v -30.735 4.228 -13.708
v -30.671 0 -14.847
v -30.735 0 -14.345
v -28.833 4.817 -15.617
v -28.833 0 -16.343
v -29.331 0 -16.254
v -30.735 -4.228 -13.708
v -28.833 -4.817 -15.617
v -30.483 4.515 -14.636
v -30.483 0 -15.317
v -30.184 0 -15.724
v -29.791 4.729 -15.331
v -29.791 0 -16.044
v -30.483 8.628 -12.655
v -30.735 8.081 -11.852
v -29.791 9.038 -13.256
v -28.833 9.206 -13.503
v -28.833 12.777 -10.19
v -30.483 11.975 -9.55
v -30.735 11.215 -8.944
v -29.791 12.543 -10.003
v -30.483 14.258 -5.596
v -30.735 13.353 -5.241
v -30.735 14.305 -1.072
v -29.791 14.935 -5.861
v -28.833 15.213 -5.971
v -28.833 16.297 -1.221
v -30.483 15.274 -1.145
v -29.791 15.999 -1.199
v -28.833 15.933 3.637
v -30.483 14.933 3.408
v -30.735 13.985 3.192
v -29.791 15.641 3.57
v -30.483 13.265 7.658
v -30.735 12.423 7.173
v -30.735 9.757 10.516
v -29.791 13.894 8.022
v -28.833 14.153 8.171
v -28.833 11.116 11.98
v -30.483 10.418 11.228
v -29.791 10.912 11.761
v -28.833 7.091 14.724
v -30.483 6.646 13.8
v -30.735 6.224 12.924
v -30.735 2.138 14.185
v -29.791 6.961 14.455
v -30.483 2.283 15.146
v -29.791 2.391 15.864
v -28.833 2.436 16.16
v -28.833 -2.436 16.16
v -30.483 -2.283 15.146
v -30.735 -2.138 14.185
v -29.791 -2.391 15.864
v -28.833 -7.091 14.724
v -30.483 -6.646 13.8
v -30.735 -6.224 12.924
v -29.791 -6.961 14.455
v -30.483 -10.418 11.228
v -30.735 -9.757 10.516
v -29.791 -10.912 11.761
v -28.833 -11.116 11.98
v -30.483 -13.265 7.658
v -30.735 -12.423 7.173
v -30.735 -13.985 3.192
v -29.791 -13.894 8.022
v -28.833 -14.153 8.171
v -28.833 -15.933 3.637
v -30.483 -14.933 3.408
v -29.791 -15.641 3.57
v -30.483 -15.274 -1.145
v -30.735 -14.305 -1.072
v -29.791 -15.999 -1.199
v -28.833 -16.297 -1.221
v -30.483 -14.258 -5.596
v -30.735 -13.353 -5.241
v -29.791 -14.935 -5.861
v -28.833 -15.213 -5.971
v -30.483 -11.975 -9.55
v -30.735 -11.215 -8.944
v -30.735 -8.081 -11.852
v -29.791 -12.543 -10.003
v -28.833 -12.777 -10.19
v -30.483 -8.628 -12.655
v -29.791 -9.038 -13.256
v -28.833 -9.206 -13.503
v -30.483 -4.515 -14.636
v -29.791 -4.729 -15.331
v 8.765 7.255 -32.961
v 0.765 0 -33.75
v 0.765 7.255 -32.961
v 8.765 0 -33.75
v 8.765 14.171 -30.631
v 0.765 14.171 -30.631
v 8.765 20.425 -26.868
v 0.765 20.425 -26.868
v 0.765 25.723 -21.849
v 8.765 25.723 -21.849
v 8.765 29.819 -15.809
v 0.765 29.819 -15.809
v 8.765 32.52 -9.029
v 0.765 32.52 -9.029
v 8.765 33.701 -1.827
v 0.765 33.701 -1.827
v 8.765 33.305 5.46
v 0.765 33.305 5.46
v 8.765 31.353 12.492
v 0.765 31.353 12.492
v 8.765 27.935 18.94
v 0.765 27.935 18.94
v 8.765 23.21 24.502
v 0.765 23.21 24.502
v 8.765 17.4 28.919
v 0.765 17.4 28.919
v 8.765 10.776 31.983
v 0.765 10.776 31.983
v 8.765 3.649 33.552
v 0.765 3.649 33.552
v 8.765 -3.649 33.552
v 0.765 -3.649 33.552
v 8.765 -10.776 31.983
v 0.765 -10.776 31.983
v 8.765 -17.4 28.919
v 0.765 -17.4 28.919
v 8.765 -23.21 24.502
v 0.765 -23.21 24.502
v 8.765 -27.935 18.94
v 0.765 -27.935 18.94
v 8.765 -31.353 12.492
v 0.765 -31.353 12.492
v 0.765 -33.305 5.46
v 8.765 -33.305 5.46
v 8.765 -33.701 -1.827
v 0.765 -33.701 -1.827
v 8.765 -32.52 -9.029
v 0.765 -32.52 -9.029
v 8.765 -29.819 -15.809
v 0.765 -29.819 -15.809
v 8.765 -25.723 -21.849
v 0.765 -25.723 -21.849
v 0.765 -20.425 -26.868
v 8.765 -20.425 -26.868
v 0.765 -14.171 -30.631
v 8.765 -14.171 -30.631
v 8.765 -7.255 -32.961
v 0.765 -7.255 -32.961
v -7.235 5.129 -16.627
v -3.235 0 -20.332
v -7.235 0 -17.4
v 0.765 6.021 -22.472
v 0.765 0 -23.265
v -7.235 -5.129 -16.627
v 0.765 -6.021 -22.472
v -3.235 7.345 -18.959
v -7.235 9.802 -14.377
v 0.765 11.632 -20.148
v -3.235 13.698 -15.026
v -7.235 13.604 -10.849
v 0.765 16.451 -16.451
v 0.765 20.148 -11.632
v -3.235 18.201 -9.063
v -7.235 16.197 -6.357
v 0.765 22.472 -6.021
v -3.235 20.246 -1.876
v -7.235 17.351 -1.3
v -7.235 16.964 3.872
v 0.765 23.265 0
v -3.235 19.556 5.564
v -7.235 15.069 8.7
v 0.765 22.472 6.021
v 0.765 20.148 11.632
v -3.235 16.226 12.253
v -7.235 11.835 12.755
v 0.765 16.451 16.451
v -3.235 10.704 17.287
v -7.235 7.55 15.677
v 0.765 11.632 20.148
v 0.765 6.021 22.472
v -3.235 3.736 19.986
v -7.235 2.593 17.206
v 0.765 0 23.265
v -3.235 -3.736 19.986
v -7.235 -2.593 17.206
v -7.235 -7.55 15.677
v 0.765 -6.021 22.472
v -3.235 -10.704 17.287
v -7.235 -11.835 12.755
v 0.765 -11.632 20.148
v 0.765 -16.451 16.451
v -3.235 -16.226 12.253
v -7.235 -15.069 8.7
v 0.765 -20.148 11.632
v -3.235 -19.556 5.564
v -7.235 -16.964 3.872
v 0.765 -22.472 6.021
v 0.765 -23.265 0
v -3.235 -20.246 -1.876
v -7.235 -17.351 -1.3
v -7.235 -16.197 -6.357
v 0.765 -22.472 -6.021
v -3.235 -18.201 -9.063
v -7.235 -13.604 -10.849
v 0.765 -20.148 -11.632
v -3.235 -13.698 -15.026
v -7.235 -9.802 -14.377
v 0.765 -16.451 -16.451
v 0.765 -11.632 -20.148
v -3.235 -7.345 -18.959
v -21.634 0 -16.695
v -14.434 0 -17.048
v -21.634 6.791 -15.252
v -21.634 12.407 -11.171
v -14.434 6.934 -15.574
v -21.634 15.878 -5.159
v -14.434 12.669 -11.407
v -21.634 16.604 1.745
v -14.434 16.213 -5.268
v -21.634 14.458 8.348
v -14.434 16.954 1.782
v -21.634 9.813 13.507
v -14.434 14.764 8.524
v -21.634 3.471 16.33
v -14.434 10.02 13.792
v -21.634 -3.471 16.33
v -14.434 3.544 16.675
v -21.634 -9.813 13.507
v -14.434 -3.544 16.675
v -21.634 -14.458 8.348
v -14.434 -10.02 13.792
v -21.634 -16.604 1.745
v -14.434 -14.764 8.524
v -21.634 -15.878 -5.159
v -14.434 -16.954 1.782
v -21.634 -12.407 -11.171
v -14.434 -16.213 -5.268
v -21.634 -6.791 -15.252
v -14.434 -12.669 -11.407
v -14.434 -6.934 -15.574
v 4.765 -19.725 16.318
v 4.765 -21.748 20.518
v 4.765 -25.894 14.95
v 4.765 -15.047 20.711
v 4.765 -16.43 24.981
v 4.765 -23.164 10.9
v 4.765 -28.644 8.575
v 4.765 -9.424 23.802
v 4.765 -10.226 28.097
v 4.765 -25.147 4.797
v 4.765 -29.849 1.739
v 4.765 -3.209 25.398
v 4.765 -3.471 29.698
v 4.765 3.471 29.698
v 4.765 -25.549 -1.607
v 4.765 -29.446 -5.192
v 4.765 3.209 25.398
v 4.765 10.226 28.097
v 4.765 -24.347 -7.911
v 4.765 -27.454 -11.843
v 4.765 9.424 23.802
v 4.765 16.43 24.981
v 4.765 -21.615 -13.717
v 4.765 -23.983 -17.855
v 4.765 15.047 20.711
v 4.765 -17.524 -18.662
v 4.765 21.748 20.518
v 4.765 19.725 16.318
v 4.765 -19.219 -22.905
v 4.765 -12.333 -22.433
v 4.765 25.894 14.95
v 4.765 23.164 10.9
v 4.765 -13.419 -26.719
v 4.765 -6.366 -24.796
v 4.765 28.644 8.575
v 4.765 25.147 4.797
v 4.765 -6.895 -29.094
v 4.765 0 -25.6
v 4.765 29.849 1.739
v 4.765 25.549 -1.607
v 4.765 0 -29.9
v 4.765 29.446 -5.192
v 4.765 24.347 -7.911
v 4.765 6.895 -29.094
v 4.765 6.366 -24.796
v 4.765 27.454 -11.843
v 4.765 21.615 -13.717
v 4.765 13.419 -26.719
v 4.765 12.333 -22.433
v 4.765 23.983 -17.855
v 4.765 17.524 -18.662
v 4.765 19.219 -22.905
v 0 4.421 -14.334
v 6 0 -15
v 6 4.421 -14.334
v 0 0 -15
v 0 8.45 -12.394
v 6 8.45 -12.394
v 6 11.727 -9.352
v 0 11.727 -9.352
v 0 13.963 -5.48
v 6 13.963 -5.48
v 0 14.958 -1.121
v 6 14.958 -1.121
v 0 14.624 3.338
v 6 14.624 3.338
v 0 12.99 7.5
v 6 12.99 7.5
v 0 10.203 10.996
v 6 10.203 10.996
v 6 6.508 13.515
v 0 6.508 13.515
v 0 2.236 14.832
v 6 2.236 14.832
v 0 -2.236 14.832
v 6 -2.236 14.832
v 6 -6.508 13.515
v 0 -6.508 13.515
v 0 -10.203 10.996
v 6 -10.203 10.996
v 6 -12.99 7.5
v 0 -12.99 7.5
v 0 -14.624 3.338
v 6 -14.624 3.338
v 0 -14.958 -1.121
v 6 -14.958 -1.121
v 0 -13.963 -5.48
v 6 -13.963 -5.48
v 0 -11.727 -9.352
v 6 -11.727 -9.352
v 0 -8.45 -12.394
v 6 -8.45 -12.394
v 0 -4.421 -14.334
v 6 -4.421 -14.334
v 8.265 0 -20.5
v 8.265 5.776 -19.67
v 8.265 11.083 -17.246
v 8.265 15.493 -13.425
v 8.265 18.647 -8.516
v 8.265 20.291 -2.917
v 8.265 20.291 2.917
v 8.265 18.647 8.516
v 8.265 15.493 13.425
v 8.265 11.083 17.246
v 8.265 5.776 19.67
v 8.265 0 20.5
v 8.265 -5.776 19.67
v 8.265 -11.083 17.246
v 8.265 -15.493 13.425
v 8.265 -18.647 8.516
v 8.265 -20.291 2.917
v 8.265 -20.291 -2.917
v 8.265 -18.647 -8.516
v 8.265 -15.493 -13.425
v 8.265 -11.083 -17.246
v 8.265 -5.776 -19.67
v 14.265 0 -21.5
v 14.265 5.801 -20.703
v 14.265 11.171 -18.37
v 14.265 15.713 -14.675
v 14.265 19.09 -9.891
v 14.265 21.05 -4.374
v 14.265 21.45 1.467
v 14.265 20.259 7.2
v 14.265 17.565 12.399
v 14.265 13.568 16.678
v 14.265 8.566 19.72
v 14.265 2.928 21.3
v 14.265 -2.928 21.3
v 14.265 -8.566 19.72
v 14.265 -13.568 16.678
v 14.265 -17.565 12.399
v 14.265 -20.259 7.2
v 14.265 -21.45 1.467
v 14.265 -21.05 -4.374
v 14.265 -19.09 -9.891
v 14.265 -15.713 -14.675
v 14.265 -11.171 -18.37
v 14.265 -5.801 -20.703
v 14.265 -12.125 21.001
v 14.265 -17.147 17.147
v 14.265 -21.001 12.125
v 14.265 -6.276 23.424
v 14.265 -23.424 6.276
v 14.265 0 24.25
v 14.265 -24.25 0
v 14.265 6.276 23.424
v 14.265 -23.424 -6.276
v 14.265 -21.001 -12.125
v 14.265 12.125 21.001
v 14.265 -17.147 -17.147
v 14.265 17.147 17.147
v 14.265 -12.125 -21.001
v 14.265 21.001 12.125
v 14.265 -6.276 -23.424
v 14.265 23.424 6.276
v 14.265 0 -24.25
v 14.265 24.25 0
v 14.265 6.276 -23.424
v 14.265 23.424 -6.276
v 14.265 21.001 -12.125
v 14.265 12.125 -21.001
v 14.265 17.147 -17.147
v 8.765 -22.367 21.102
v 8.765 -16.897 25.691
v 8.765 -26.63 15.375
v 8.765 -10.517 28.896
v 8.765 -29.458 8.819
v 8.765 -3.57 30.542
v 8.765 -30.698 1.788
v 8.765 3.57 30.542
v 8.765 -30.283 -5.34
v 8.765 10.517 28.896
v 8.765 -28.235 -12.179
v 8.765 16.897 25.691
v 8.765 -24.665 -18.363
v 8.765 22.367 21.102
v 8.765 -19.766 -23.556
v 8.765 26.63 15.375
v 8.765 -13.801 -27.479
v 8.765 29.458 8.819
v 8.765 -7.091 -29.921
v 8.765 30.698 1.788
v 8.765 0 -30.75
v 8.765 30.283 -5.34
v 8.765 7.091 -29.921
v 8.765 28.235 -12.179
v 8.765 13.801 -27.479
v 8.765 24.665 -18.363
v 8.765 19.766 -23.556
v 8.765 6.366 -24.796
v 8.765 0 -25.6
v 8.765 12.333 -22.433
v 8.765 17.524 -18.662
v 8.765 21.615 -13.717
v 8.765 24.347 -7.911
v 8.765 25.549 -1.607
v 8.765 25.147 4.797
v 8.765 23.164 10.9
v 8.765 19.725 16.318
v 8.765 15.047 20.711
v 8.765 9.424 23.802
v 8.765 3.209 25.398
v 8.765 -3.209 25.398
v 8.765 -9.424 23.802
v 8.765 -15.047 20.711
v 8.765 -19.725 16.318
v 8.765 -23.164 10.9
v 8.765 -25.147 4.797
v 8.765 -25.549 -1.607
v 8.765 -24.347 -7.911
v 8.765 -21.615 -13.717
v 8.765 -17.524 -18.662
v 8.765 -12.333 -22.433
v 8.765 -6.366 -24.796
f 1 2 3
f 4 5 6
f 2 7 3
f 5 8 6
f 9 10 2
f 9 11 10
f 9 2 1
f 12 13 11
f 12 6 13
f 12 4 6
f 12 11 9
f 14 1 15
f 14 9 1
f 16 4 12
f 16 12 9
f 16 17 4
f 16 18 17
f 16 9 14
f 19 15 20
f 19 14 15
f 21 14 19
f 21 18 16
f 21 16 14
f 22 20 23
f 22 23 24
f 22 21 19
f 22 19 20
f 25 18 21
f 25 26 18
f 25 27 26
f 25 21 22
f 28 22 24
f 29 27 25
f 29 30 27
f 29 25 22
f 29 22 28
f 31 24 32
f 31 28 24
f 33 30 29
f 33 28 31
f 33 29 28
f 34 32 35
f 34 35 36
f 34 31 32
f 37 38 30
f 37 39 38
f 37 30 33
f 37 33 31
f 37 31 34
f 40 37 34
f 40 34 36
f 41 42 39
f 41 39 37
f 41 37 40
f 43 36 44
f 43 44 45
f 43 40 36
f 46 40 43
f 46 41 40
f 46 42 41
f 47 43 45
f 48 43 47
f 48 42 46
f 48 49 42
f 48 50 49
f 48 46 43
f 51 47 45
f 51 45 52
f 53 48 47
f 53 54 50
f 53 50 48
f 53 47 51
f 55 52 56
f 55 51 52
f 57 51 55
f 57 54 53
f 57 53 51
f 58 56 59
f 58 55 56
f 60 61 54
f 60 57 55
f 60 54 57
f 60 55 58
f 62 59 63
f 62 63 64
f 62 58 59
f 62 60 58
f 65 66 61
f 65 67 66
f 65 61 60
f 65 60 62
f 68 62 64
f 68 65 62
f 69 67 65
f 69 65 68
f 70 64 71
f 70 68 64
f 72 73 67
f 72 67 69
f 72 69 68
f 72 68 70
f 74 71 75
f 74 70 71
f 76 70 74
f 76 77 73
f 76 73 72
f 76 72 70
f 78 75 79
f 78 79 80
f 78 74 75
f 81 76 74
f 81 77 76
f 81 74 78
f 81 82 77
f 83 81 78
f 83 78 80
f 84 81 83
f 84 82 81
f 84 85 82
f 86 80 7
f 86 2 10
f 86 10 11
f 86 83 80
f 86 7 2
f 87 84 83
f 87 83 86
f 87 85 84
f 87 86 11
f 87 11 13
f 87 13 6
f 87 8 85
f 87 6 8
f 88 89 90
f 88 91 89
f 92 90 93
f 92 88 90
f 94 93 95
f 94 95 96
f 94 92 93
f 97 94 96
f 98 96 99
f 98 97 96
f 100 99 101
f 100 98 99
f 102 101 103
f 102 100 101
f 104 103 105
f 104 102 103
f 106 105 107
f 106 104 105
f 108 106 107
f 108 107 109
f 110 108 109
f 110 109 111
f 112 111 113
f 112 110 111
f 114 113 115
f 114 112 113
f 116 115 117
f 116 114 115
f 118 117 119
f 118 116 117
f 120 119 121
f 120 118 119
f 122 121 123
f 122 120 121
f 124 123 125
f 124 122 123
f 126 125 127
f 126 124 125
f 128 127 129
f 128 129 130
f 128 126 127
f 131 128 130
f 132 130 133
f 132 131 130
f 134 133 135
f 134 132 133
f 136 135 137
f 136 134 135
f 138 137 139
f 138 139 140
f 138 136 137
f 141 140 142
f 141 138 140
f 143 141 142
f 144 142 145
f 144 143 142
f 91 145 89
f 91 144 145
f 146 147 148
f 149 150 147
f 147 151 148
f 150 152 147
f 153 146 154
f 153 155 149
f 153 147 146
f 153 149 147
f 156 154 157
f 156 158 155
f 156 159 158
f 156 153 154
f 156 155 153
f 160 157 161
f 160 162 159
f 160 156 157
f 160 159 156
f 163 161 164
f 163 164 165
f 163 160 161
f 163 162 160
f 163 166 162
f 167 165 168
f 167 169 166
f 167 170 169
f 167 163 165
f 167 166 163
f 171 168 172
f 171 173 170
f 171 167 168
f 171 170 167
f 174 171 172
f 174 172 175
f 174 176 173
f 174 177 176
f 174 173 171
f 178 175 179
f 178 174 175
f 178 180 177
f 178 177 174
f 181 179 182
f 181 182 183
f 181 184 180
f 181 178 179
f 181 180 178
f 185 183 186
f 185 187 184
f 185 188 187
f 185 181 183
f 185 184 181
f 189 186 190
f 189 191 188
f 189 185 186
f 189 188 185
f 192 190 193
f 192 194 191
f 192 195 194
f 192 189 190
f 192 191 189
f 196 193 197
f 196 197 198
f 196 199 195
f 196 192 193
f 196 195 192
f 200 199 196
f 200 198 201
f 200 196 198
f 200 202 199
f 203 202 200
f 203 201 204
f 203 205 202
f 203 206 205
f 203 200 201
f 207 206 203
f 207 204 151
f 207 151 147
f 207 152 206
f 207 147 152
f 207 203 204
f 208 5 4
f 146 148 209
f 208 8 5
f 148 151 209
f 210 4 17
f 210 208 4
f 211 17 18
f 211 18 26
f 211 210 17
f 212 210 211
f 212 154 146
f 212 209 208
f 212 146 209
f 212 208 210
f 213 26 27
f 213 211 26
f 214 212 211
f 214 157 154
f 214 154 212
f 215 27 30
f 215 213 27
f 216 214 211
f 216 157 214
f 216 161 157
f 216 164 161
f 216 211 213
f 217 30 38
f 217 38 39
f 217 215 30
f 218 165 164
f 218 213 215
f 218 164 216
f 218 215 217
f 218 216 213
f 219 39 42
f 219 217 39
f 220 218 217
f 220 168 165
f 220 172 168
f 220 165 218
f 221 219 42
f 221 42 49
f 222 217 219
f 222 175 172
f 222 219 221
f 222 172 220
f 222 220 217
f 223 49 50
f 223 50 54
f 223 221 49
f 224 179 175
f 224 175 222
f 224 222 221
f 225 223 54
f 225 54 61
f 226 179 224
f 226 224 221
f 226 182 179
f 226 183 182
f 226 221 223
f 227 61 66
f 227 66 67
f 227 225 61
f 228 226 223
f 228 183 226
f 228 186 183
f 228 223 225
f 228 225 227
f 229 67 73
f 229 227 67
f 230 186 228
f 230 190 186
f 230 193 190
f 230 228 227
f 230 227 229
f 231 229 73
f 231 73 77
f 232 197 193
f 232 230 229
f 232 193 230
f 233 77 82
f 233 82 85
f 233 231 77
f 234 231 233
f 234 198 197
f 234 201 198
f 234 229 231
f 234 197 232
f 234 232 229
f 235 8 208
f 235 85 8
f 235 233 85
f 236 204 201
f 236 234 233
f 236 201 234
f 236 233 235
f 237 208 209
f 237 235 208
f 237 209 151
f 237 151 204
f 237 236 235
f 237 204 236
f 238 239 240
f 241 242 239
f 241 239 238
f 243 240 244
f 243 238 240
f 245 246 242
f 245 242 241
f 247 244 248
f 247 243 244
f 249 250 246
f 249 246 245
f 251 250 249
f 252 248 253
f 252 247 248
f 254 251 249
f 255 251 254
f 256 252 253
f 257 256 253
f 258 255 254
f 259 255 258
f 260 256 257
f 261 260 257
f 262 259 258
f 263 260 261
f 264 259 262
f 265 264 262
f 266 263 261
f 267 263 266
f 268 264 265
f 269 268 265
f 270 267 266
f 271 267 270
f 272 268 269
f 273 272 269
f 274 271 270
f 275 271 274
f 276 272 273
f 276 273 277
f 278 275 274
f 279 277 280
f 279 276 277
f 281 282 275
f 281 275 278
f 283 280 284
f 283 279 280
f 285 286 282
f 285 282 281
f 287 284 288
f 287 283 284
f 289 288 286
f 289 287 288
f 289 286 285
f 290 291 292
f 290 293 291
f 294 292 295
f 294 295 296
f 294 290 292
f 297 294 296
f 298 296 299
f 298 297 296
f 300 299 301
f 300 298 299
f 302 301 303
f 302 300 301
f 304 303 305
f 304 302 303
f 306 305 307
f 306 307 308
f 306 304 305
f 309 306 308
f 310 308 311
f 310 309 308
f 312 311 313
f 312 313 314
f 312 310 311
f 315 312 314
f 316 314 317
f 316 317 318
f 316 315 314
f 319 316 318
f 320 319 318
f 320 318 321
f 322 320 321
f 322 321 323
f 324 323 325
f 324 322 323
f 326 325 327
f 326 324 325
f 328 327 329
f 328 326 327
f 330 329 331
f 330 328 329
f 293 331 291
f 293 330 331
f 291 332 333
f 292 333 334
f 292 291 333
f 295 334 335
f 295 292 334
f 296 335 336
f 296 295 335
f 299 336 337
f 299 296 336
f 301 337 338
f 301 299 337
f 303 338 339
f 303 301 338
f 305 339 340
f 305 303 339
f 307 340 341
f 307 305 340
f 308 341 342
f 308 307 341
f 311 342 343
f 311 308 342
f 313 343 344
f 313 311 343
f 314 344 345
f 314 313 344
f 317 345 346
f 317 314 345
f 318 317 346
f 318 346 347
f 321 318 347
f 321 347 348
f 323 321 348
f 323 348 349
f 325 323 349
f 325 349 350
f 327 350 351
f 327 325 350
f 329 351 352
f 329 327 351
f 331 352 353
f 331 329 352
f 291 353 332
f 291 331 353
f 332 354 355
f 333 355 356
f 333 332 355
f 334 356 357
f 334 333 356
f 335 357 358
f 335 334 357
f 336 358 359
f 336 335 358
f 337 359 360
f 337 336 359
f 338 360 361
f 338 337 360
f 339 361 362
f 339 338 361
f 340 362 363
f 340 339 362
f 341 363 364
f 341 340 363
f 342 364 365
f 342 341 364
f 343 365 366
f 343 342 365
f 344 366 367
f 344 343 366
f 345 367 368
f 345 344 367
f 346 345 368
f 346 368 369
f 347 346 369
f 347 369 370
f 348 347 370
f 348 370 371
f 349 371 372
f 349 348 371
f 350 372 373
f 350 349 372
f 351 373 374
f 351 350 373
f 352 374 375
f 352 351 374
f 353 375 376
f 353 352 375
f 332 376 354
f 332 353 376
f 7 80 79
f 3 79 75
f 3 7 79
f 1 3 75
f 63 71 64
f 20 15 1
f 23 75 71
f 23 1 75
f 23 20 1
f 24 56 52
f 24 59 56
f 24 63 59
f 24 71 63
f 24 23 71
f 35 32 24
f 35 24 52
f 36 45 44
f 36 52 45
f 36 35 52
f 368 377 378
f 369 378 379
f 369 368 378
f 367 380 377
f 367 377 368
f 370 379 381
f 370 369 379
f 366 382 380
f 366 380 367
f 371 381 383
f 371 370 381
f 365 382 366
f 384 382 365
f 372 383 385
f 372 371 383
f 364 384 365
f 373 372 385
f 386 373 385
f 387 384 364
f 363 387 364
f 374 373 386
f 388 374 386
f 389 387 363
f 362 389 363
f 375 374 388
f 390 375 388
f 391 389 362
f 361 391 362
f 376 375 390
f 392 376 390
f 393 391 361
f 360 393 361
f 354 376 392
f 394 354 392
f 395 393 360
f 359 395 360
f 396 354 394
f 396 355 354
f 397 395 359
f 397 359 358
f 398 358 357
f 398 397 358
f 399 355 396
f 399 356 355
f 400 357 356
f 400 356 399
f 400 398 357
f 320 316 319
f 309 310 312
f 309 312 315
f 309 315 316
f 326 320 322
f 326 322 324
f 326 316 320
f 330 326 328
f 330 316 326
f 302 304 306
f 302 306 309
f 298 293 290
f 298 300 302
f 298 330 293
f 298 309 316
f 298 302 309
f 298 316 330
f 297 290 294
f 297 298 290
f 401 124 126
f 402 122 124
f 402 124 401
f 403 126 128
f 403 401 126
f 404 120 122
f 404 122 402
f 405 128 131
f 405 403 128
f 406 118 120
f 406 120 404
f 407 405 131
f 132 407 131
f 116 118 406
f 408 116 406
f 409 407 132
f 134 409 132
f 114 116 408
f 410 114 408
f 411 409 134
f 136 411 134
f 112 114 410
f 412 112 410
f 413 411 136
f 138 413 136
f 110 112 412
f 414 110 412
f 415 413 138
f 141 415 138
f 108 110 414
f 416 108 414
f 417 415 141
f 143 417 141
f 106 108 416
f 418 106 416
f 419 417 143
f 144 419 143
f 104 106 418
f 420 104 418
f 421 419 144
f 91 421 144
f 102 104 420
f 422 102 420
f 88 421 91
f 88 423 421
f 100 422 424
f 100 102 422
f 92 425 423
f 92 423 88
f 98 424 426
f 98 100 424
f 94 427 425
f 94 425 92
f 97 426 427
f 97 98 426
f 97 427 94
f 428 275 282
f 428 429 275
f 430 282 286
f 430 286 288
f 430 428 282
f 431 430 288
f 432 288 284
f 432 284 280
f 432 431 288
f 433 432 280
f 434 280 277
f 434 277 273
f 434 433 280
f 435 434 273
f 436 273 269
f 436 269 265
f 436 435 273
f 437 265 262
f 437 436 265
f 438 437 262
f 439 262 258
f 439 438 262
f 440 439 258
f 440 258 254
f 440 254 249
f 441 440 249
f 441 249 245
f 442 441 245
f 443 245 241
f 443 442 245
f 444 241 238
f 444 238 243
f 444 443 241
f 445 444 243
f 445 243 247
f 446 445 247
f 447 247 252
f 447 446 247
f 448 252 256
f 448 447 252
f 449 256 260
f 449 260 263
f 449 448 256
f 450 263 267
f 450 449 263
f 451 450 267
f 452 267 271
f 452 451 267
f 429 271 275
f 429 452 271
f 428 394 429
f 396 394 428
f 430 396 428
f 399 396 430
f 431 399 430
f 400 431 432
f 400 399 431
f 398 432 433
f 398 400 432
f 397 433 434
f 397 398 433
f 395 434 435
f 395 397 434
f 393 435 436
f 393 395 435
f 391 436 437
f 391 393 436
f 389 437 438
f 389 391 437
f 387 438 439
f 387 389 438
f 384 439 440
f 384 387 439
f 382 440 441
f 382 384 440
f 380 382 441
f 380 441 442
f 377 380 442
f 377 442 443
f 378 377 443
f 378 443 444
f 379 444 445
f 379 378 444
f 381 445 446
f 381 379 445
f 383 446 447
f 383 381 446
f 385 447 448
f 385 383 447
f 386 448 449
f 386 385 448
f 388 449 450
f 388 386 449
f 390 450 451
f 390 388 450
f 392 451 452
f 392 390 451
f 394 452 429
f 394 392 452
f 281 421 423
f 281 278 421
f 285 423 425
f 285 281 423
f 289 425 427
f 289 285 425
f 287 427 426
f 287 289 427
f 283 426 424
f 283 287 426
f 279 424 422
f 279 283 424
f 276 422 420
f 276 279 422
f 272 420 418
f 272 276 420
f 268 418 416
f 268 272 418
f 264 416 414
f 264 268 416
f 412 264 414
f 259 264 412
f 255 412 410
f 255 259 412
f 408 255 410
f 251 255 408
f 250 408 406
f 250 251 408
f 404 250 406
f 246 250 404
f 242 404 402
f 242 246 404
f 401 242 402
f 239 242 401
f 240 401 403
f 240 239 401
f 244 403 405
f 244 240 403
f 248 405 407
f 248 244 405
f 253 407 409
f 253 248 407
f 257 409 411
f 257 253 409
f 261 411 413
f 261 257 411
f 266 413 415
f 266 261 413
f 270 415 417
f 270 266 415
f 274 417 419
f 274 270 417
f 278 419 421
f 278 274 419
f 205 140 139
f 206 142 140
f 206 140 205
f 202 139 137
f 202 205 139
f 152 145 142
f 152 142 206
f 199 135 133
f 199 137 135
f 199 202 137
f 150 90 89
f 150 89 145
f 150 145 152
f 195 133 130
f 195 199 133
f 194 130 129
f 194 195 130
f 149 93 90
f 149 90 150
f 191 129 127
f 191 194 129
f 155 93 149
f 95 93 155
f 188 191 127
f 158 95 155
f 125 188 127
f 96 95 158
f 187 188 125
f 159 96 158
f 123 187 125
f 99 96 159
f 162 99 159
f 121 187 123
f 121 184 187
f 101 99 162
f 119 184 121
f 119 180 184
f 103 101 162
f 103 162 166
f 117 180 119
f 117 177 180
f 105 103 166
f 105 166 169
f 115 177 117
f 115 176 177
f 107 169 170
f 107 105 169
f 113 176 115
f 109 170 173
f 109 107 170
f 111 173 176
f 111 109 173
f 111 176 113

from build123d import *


with BuildPart() as f1:
    # F0 (on Front) → F1 (revolve)
    with BuildSketch(Plane.XZ):
        with BuildLine():
            ThreePointArc((-30.735126, -14.345073), (-30.183512, -15.724301), (-28.832915, -16.342715))
            Line((-28.832915, -16.342715), (-7.235178, -17.4))
            Line((-7.235178, -17.4), (0.764822, -23.264802))
            Line((0.764822, -23.264802), (0.764822, -33.75))
            Line((0.764822, -33.75), (8.764822, -33.75))
            Line((8.764822, -33.75), (8.764822, -30.75))
            Line((8.764822, -30.75), (4.764822, -29.899774))
            Line((4.764822, -29.899774), (4.764822, -25.6))
            Line((4.764822, -25.6), (8.764822, -25.6))
            Line((8.764822, -25.6), (14.264822, -24.25))
            Line((14.264822, -24.25), (14.264822, -21.5))
            Line((14.264822, -21.5), (8.264822, -20.5))
            Line((8.264822, -20.5), (6, -15))
            Line((6, -15), (0, -15))
            Line((0, -15), (0, 0))
            Line((0, 0), (-30.735126, 0))
            Line((-30.735126, 0), (-30.735126, -14.345073))
        make_face()
    revolve(axis=Axis((-8.246858, 0, 0), (1, 0, 0)))


solid = f1.part
